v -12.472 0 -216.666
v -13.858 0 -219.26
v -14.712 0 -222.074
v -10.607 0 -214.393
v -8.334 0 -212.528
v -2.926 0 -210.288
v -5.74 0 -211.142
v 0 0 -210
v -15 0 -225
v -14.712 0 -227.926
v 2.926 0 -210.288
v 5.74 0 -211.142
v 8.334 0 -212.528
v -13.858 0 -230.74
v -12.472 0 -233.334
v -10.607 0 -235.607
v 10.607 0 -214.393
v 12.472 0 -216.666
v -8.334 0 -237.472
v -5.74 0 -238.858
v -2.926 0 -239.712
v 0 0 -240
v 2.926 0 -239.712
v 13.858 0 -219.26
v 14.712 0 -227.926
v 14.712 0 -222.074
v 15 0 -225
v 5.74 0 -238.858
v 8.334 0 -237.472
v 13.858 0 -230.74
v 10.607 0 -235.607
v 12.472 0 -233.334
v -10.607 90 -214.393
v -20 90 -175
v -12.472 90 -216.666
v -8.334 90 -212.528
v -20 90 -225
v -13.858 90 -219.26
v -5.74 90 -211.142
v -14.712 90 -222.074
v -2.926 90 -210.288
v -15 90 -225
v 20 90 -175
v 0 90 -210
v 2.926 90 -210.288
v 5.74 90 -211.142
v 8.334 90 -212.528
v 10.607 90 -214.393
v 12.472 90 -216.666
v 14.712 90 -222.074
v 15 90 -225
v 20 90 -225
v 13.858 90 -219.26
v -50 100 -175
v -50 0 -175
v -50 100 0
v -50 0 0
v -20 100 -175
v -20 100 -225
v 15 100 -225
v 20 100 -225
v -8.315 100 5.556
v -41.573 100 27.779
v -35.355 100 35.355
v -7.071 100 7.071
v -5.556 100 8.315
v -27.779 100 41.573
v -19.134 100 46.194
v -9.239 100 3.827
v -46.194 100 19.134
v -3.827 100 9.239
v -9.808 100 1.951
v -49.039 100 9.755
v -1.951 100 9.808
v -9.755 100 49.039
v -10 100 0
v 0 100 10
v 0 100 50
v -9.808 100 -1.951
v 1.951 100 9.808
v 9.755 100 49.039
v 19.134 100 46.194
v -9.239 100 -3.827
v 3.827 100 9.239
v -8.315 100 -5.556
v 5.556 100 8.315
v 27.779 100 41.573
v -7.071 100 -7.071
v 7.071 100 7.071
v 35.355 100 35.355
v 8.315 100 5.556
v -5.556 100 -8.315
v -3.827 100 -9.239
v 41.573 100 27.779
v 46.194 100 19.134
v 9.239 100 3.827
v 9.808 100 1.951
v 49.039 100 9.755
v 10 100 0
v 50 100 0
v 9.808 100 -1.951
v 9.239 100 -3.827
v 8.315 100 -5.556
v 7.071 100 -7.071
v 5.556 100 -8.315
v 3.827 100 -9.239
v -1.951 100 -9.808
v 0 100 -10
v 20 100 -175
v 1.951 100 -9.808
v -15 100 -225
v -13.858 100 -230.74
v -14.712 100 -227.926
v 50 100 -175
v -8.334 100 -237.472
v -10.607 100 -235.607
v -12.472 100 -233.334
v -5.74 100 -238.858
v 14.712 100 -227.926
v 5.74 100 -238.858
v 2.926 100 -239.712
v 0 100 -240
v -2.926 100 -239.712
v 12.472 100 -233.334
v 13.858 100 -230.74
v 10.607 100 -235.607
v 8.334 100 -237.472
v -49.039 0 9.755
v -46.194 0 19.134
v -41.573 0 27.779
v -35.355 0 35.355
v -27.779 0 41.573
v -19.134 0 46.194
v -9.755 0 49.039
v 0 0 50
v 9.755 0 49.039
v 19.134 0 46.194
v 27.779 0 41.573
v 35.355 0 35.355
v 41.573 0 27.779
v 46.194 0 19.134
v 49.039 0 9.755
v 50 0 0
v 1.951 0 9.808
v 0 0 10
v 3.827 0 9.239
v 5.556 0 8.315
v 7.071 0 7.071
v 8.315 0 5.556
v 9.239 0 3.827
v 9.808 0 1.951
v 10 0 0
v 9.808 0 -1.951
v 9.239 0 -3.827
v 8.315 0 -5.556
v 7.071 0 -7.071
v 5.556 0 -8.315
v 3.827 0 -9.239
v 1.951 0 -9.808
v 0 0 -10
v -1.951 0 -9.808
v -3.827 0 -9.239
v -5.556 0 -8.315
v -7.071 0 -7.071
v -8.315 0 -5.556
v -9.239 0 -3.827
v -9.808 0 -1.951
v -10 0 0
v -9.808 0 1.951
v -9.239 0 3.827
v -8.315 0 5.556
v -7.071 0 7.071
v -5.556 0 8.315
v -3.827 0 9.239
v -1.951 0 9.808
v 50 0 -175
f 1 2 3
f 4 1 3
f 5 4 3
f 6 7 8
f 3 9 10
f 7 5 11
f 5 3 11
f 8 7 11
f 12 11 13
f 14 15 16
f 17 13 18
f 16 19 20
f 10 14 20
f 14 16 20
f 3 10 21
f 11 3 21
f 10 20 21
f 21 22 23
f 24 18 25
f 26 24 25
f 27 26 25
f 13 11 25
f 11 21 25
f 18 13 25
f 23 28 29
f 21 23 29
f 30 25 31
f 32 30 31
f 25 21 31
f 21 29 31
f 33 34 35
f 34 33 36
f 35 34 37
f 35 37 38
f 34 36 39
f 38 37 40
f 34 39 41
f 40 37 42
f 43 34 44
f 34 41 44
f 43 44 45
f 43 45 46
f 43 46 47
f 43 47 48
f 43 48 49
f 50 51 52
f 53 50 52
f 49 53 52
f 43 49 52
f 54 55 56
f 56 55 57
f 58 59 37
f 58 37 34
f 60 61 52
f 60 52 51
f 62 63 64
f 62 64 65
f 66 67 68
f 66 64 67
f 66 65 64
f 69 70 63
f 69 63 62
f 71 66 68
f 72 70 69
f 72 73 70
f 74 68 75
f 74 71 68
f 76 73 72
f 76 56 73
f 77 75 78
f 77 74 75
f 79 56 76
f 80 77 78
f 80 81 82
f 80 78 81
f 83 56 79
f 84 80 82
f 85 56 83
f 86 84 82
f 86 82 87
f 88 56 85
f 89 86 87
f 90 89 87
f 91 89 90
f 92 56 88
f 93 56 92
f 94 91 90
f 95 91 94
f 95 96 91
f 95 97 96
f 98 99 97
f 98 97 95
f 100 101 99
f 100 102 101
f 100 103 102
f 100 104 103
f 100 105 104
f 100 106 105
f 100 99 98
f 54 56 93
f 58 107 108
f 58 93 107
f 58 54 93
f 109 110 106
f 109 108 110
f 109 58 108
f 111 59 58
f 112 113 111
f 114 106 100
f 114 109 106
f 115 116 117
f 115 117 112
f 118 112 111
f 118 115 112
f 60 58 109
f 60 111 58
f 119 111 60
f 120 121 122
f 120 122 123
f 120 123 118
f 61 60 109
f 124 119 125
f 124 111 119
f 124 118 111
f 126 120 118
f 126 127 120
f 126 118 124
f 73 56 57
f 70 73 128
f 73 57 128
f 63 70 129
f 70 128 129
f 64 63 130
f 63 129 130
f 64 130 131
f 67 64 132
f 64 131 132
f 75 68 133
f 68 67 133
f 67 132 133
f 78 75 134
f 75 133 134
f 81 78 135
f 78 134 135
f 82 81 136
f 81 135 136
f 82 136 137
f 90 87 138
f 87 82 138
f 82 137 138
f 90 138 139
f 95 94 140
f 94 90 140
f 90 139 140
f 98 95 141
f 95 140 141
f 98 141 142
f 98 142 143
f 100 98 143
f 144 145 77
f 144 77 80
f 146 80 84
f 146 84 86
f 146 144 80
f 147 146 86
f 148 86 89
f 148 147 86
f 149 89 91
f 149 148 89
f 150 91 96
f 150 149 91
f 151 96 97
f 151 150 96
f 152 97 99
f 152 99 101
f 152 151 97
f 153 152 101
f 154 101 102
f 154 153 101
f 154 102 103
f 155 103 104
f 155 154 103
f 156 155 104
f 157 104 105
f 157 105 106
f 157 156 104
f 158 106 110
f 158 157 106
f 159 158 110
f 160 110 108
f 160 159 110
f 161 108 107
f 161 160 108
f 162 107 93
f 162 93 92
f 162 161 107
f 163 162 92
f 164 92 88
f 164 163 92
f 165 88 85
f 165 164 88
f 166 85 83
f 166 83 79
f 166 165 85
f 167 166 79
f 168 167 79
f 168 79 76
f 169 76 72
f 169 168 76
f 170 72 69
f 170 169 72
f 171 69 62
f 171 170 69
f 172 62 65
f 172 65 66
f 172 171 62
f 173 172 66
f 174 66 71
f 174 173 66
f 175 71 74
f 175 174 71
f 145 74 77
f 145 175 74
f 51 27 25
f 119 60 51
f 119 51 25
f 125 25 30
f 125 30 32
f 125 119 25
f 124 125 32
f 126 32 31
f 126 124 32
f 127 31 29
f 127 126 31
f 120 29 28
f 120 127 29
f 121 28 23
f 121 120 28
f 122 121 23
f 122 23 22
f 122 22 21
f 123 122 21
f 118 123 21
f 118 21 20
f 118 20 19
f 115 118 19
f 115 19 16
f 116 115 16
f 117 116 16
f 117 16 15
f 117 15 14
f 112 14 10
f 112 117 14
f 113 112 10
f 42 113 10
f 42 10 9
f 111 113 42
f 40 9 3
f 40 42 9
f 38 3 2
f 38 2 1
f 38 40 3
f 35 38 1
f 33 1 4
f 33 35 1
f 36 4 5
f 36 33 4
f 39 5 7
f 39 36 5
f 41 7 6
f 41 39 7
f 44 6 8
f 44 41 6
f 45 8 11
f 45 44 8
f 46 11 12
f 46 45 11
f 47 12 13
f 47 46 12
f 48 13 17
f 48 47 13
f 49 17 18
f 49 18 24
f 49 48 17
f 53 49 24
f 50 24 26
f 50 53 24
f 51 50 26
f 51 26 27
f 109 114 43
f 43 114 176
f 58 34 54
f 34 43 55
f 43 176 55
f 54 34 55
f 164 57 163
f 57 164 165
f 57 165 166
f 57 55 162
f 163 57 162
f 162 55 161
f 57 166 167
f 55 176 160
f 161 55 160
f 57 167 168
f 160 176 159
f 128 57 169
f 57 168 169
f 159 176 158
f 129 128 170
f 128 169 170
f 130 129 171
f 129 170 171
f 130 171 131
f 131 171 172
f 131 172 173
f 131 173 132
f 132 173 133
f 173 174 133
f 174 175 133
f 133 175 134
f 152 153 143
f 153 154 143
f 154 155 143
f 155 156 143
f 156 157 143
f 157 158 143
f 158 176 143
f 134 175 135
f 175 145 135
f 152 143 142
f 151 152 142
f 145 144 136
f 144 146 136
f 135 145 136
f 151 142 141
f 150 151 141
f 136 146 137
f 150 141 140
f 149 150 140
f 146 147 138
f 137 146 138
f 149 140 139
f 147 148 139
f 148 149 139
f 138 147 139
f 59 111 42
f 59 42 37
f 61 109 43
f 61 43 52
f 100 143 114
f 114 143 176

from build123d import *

# Parameters (mm, degrees)
SKETCH2_R           = 50
SKETCH2_R_2         = 10
BOSS_EXTRUDE1_DEPTH = 100
BOSS_EXTRUDE2_START = -100
BOSS_EXTRUDE2_DEPTH = 100
BOSS_EXTRUDE3_DEPTH = 10
BOSS_EXTRUDE4_DEPTH = 100


with BuildPart() as part:
    # Sketch2 → Boss-Extrude1 (new body)
    with BuildSketch(Plane(origin=(0, 0, 0), x_dir=(1, 0, 0), z_dir=(0, 1, 0))):
        with Locations(Location((0, 0, 0), (0, 0, 270))):
            Circle(SKETCH2_R)
        with Locations(Location((0, 0, 0), (0, 0, 270))):
            Circle(SKETCH2_R_2, mode=Mode.SUBTRACT)
    extrude(amount=BOSS_EXTRUDE1_DEPTH)

    # Sketch3 → Boss-Extrude2 (add)
    with BuildSketch(Plane(origin=(0, 100, 0), x_dir=(1, 0, 0), z_dir=(0, 1, 0)).offset(BOSS_EXTRUDE2_START)):
        with BuildLine():
            ThreePointArc((-50, 0), (0, 50), (50, 0))
            Line((50, 0), (50, 175))
            Line((50, 175), (-50, 175))
            Line((-50, 175), (-50, 0))
        make_face()
    extrude(amount=BOSS_EXTRUDE2_DEPTH)

    # Sketch4 → Boss-Extrude3 (add)
    with BuildSketch(Plane(origin=(0, 100, 0), x_dir=(1, 0, 0), z_dir=(0, 1, 0))):
        with BuildLine():
            Line((-20, 175), (20, 175))
            Line((20, 175), (20, 225))
            Line((20, 225), (15, 225))
            ThreePointArc((15, 225), (0, 210), (-15, 225))
            Line((-15, 225), (-20, 225))
            Line((-20, 225), (-20, 175))
        make_face()
    extrude(amount=-BOSS_EXTRUDE3_DEPTH)

    # Sketch4<3> → Boss-Extrude4 (add)
    with BuildSketch(Plane(origin=(0, 100, 0), x_dir=(1, 0, 0), z_dir=(0, 1, 0))):
        with BuildLine():
            ThreePointArc((-15, 225), (0, 210), (15, 225))
            Line((15, 225), (-15, 225))
        make_face()
        with BuildLine():
            Line((-15, 225), (15, 225))
            ThreePointArc((15, 225), (0, 240), (-15, 225))
        make_face()
    extrude(amount=-BOSS_EXTRUDE4_DEPTH)


solid = part.part
